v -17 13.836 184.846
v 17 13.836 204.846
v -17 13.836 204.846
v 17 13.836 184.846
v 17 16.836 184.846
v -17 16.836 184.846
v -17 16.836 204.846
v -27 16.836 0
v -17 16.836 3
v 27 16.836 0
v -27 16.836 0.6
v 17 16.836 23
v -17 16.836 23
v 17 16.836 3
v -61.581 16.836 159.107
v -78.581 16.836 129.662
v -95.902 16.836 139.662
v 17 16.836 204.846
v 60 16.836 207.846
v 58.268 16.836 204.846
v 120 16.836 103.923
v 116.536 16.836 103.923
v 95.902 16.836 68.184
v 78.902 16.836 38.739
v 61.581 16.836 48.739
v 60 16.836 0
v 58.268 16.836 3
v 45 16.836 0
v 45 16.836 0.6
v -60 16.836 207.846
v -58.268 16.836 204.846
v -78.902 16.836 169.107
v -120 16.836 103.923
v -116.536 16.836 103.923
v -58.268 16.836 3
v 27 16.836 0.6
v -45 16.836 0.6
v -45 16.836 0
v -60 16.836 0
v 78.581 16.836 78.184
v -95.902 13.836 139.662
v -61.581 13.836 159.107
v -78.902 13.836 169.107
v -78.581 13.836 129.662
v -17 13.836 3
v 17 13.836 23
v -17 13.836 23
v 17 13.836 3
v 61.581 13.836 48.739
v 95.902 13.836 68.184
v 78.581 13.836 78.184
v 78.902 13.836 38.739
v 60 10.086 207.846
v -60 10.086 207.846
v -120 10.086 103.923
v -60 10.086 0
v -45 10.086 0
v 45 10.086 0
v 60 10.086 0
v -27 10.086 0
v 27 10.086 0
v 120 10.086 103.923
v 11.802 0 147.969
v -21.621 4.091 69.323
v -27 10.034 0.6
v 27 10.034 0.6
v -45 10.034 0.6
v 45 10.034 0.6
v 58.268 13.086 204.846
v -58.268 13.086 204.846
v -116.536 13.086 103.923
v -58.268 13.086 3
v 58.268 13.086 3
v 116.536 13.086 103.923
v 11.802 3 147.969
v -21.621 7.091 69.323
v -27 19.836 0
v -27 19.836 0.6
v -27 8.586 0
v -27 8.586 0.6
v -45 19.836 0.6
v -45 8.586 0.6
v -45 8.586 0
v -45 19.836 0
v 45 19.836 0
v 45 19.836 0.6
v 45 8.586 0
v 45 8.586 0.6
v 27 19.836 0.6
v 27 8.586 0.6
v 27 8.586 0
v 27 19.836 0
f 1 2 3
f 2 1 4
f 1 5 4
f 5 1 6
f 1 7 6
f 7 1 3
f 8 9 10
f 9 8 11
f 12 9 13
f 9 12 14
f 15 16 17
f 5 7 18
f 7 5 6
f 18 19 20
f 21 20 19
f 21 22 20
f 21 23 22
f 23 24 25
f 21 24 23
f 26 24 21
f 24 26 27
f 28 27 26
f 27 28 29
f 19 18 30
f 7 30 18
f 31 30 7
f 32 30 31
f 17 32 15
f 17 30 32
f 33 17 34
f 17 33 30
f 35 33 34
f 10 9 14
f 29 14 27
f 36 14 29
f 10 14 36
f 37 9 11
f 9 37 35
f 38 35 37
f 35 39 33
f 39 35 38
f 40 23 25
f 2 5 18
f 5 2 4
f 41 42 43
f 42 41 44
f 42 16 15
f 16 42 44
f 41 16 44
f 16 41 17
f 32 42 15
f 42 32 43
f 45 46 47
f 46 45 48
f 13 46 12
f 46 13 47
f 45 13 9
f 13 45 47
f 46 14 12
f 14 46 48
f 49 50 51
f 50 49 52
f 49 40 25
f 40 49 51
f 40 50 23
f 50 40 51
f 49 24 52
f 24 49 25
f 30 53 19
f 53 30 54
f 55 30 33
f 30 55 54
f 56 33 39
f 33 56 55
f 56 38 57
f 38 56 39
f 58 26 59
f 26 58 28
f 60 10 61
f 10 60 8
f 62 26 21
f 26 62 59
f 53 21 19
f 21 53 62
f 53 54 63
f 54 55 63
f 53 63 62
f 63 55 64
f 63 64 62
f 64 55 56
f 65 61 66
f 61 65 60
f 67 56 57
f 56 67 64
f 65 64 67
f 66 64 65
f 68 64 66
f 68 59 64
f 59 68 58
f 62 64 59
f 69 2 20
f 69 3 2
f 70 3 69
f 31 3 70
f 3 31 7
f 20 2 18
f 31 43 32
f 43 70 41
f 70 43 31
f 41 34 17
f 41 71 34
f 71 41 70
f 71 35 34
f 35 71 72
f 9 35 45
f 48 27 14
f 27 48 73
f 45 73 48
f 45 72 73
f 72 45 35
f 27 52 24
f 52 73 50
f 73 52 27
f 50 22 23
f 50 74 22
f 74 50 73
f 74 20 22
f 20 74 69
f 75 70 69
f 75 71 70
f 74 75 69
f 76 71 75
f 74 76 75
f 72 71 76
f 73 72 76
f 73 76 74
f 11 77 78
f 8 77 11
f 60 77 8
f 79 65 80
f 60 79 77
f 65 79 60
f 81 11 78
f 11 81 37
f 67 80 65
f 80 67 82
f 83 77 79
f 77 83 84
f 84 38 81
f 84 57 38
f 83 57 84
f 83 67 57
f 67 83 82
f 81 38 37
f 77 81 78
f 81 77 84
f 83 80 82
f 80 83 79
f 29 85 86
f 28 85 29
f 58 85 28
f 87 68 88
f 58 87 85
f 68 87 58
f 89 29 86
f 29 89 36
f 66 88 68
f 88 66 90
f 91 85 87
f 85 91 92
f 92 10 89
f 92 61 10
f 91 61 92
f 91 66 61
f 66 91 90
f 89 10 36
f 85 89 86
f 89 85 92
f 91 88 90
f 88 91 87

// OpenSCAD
/*
    parametric_faceted_hex_wall_tile_mount_v26_multi_plate_vertical_joined.scad
    ----------------------------------------------------------------
    Regular asymmetric low-poly hex wall tile.

    v26 goals
    ---------
    1. Multi-object plate packing is the default design target.
    2. Preserve a TRUE regular hexagon -- no X/Y stretching.
    3. Default maximum corner-to-corner width = 240 mm / 9.449 in.
    4. Vertical export rests on a complete flat hex side, not a point.
    5. Open back remains fully open.
    6. Hidden mounting pads remain clipped below the visible face.
    7. One master thickness controls shell, perimeter, and pads.
    8. Integrated low-profile sacrificial stabilizer feet are enabled by default.
    9. Feet are intentionally shallow to improve multi-copy stability without
       consuming excessive plate depth.

    Recommended default
    -------------------
    face_size_reference      = "across_corners";
    face_size_units          = "mm";
    face_size                = 240.0;   // 9.449" maximum width

    tile_rotation_deg        = 15;

    export_orientation       = "vertical";
    vertical_edge_angle_deg  = 15;      // flat side on build plate

    master_thickness_mm      = 3.0;
    add_mount_pads           = true;
    add_mount_ribs           = false;

    // Multi-copy stability:
    add_vertical_breakaway_feet = true;
    vertical_foot_depth_mm       = 5.0;
    vertical_foot_height_mm      = 0.60;
    vertical_foot_neck_mm        = 0.80;

    Export
    ------
    F6 Render
    File -> Export -> Export as STL
*/


// =============================================================================
// CUSTOMIZER PARAMETERS
// =============================================================================


/* [Finished Face Size] */

// "bounding_square"
//     face_size is the maximum X and Y envelope.
//
// "flat_to_flat"
//     face_size is the traditional hex flat-to-flat dimension.
//
// "across_corners"
//     face_size is the regular-hex corner-to-corner dimension.
//
// v26 DEFAULT:
// across_corners = 240 mm so the vertically printed tile is about:
//     X = 240.0 mm
//     Z = 207.85 mm
// while resting on a complete flat edge.
face_size_reference = "across_corners"; // [bounding_square, flat_to_flat, across_corners]

// Units used by face_size.
face_size_units = "mm";                   // [mm, in]

// Default = 240 mm / 9.449 in maximum corner-to-corner width.
// This leaves useful X-axis margin on a 256 mm plate.
face_size = 240.0;

// Rotation of the finished hex within its face plane.
//
// IMPORTANT:
// 15 degrees gives a regular hex an equal X/Y bounding envelope.
// With bounding_square + 254 mm this produces approximately:
//     X = 254.0 mm
//     Y = 254.0 mm
tile_rotation_deg = 15;


/* [Export / Print Orientation] */

// "flat"     = conventional CAD orientation; decorative face points +Z.
// "vertical" = rotate final part onto an edge for vertical printing.
export_orientation = "vertical";          // [flat, vertical]

// Additional in-plane rotation used ONLY before standing the part vertically.
//
// IMPORTANT:
// The finished face uses tile_rotation_deg = 15 so its X/Y envelope is exactly
// square. A regular hex rests on a FLAT SIDE when its effective print-plane
// rotation is 30 degrees (modulo 60 degrees).
//
// Therefore the default vertical export adds another 15 degrees:
//
//     15 deg finished-face rotation
//   + 15 deg vertical export rotation
//   = 30 deg effective print rotation
//
// This puts a complete flat hex side on the build plate instead of a point.
// The transformed model is automatically translated so that side rests at Z=0.
// Rotate the finished 15-degree face orientation another 15 degrees before
// standing it up. 15 + 15 = 30 degrees, which places a complete hex side
// horizontally at the bottom rather than balancing the tile on a vertex.
vertical_edge_angle_deg = 15;

// Add small breakaway stabilizer feet after the model is stood vertically.
// Normally leave OFF and use a slicer brim if required.
add_vertical_breakaway_feet = true;

// Breakaway-foot dimensions.
vertical_foot_length_mm = 18.0;
vertical_foot_depth_mm = 5.0;
vertical_foot_height_mm = 0.60;
vertical_foot_neck_mm = 0.80;


/* [MASTER THICKNESS] */

// Main material thickness control.
master_thickness_mm = 3.0;

// Optional tuning multipliers.
front_shell_multiplier = 1.0;
perimeter_multiplier   = 1.0;
mount_pad_multiplier   = 1.0;


/* [Front Relief] */

// "proportional" scales relief with the true flat-to-flat dimension.
// "absolute" uses explicit millimeter values.
relief_height_mode = "proportional";      // [proportional, absolute]

relief_scale = 1.0;

// Relative relief proportions.
peak_height_ratio = 0.081;
ridge_to_peak_ratio = 0.757;
edge_to_peak_ratio = 0.097;

// Used only in absolute mode.
peak_height_mm   = 18.5;
ridge_height_mm = 14.0;
edge_height_mm  = 1.8;

// Minimum air gap between inner roof and mounting geometry.
edge_clearance_mm = 0.60;


/* [Facet Layout] */

peak_angle_deg = 45;
peak_radius_ratio = 0.38;

ridge_angle_deg = 208;
ridge_radius_ratio = 0.34;


/* [Wall Mounting] */

add_mount_pads = true;

// Width parallel to local hex edge.
mount_pad_width_mm = 34.0;

// Radial depth into the cavity.
mount_pad_depth_mm = 24.0;

// Structural overlap beneath the inner perimeter shell.
mount_pad_overlap_mm = 4.0;

// Pull mounting geometry inward from the visible outside perimeter.
 // Keep this smaller than the perimeter-wall thickness so the pad still
 // overlaps the wall by a positive amount.
// IMPORTANT:
 // Must be LESS than perimeter_wall_thickness_mm so the pads physically
 // overlap the perimeter wall and become one connected solid.
 mount_pad_edge_inset_mm = 1.0;

// Clearance below underside of visible face.
mount_face_clearance_mm = 0.75;

// Mount-pad directions in the tile's local coordinate system.
mount_pad_angles = [60, 120, 240, 300];


/* [Mount Reinforcement] */

add_mount_ribs = false;

mount_rib_width_mm  = 3.0;
mount_rib_height_mm = 5.0;
mount_rib_depth_mm  = 8.0;


/* [Optional Screw Holes] */

add_pad_screw_holes = false;

pad_screw_hole_diameter_mm = 4.5;



/* [Plate Packing Guidance] */

// These values do NOT duplicate objects inside the STL.
// They provide planning numbers in the OpenSCAD console for arranging
// multiple copies in the slicer.
//
// Typical X2D-style plate planning:
//   usable Y = 256 mm
//   keep a conservative front/rear margin
plate_depth_mm = 256.0;

plate_front_margin_mm = 8.0;
plate_rear_margin_mm  = 8.0;

// Recommended empty gap between adjacent standing tiles.
// Increase if using aggressive acceleration or if the printer has noticeable
// resonance/wobble on tall parts.
recommended_inter_tile_gap_mm = 8.0;

// Feet extend from Y=0 to vertical_foot_depth_mm.
// The actual tile relief occupies approximately peak_height in Y.
// Packing pitch uses whichever is deeper, plus the inter-tile gap.

/* [Advanced] */

polyhedron_convexity = 12;
screw_hole_fn = 40;

// Small numerical tolerance.
eps = 0.01;


// =============================================================================
// HELPERS
// =============================================================================

function polar(angle_deg, radius) =
    [
        radius * cos(angle_deg),
        radius * sin(angle_deg)
    ];

function hex_vertex_unrotated(i, radius) =
    [
        radius * cos(30 + i * 60),
        radius * sin(30 + i * 60)
    ];

function rotate2d(p, angle_deg) =
    [
        p[0] * cos(angle_deg) - p[1] * sin(angle_deg),
        p[0] * sin(angle_deg) + p[1] * cos(angle_deg)
    ];

function hex_vertex(i, radius) =
    rotate2d(
        hex_vertex_unrotated(i, radius),
        tile_rotation_deg
    );

// Half-width / half-height of a unit-circumradius rotated regular hex.
function unit_hex_half_x(rotation_deg) =
    max([
        for (i = [0 : 5])
            abs(
                cos(30 + i * 60 + rotation_deg)
            )
    ]);

function unit_hex_half_y(rotation_deg) =
    max([
        for (i = [0 : 5])
            abs(
                sin(30 + i * 60 + rotation_deg)
            )
    ]);

// Bounding box of a regular hex with circumradius r.
function hex_bbox_x(r, rotation_deg) =
    2 * r * unit_hex_half_x(rotation_deg);

function hex_bbox_y(r, rotation_deg) =
    2 * r * unit_hex_half_y(rotation_deg);


// =============================================================================
// DERIVED MATERIAL THICKNESSES
// =============================================================================

front_shell_thickness_mm =
    master_thickness_mm * front_shell_multiplier;

perimeter_wall_thickness_mm =
    master_thickness_mm * perimeter_multiplier;

mount_pad_thickness_mm =
    master_thickness_mm * mount_pad_multiplier;


// =============================================================================
// DERIVED FACE DIMENSIONS
// =============================================================================

_face_size_mm =
    face_size_units == "in"
        ? face_size * 25.4
        : face_size;

// If bounding_square is selected, choose the largest regular-hex radius that
// fits inside both the requested X and Y dimensions.
//
// At tile_rotation_deg = 15, unit X and Y extents are equal, so both dimensions
// become exactly face_size.
r_outer =
    face_size_reference == "flat_to_flat"
        ? (_face_size_mm / 2) / cos(30)
        : face_size_reference == "across_corners"
            ? _face_size_mm / 2
            : min(
                _face_size_mm / (2 * unit_hex_half_x(tile_rotation_deg)),
                _face_size_mm / (2 * unit_hex_half_y(tile_rotation_deg))
              );

tile_flat_to_flat =
    2 * r_outer * cos(30);

tile_across_corners =
    2 * r_outer;

finished_bbox_x =
    hex_bbox_x(r_outer, tile_rotation_deg);

finished_bbox_y =
    hex_bbox_y(r_outer, tile_rotation_deg);

outer_apothem =
    tile_flat_to_flat / 2;

inner_apothem =
    outer_apothem - perimeter_wall_thickness_mm;

r_inner =
    inner_apothem / cos(30);

inner_flat_length =
    2 * inner_apothem * tan(30);

hex_side_length =
    r_outer;


// =============================================================================
// DERIVED RELIEF HEIGHTS
// =============================================================================

_peak_unscaled =
    relief_height_mode == "proportional"
        ? tile_flat_to_flat * peak_height_ratio
        : peak_height_mm;

_ridge_unscaled =
    relief_height_mode == "proportional"
        ? _peak_unscaled * ridge_to_peak_ratio
        : ridge_height_mm;

_requested_edge_unscaled =
    relief_height_mode == "proportional"
        ? _peak_unscaled * edge_to_peak_ratio
        : edge_height_mm;

peak_height =
    _peak_unscaled * relief_scale;

ridge_height =
    _ridge_unscaled * relief_scale;

requested_edge_height =
    _requested_edge_unscaled * relief_scale;

// Enough vertical room for front shell + complete pad + clearance.
minimum_edge_height =
    front_shell_thickness_mm
    + mount_pad_thickness_mm
    + mount_face_clearance_mm;

edge_height =
    max(
        requested_edge_height,
        minimum_edge_height
    );


// =============================================================================
// DERIVED MOUNTING GEOMETRY
// =============================================================================

mount_pad_desired_outer_r =
    inner_apothem + mount_pad_overlap_mm;

mount_pad_inner_r =
    mount_pad_desired_outer_r - mount_pad_depth_mm;

mount_pad_center_r =
    mount_pad_desired_outer_r - mount_pad_depth_mm / 2;

mount_clip_apothem =
    outer_apothem - mount_pad_edge_inset_mm;

mount_clip_radius =
    mount_clip_apothem / cos(30);


// =============================================================================
// VERTICAL-EXPORT DERIVED VALUES
// =============================================================================
//
// The tile is first rotated around Z by vertical_edge_angle_deg, then stood up
// by +90 degrees around X.
//
// We calculate the local Y envelope AFTER that optional Z rotation so the
// final model can be translated to put its lowest point exactly on Z=0.

vertical_rotation_total_deg =
    vertical_edge_angle_deg;

vertical_half_y =
    max([
        for (i = [0 : 5])
            abs(
                r_outer
                * sin(
                    30
                    + i * 60
                    + tile_rotation_deg
                    + vertical_rotation_total_deg
                )
            )
    ]);

vertical_print_height =
    2 * vertical_half_y;

// After rotate([90,0,0]), original +Z becomes -Y.
// Translate by peak_height so all relief lies in positive Y.
vertical_print_depth =
    peak_height;

// Multi-copy packing envelope in Y.
//
// vertical_tile() occupies approximately peak_height of Y-depth.
// Breakaway feet occupy vertical_foot_depth_mm.
// Use the larger dimension as the per-part physical depth.
vertical_object_depth =
    add_vertical_breakaway_feet
        ? vertical_print_depth + 3.0
        : vertical_print_depth;

recommended_copy_pitch_y =
    vertical_object_depth + recommended_inter_tile_gap_mm;

usable_plate_depth =
    plate_depth_mm
    - plate_front_margin_mm
    - plate_rear_margin_mm;

estimated_copies_per_plate_depth =
    max(
        1,
        floor(
            (
                usable_plate_depth
                + recommended_inter_tile_gap_mm
            )
            / recommended_copy_pitch_y
        )
    );


// =============================================================================
// VALIDATION
// =============================================================================

assert(
    _face_size_mm > 0,
    "face_size must produce a positive dimension."
);

assert(
    master_thickness_mm > 0,
    "master_thickness_mm must be greater than zero."
);

assert(
    front_shell_multiplier > 0
    && perimeter_multiplier > 0
    && mount_pad_multiplier > 0,
    "All thickness multipliers must be greater than zero."
);

assert(
    front_shell_thickness_mm > 0,
    "front_shell_thickness_mm must be greater than zero."
);

assert(
    perimeter_wall_thickness_mm > 0,
    "perimeter_wall_thickness_mm must be greater than zero."
);

assert(
    perimeter_wall_thickness_mm < outer_apothem,
    "perimeter_wall_thickness_mm is too large for this tile."
);

assert(
    inner_apothem > 0,
    "The selected perimeter wall leaves no hollow interior."
);

assert(
    edge_height > front_shell_thickness_mm,
    "Internal error: edge_height must exceed front_shell_thickness_mm."
);

assert(
    ridge_height > edge_height,
    "ridge_height must remain greater than the effective edge height."
);

assert(
    peak_height > ridge_height,
    "peak_height must remain greater than ridge_height."
);

assert(
    peak_radius_ratio > 0 && peak_radius_ratio < 0.90,
    "peak_radius_ratio must be between 0 and 0.90."
);

assert(
    ridge_radius_ratio > 0 && ridge_radius_ratio < 0.90,
    "ridge_radius_ratio must be between 0 and 0.90."
);

assert(
    mount_pad_width_mm > 0,
    "mount_pad_width_mm must be greater than zero."
);

assert(
    mount_pad_depth_mm > 0,
    "mount_pad_depth_mm must be greater than zero."
);

assert(
    mount_pad_thickness_mm > 0,
    "mount_pad_thickness_mm must be greater than zero."
);

assert(
    mount_pad_overlap_mm >= 0,
    "mount_pad_overlap_mm cannot be negative."
);

assert(
    mount_pad_edge_inset_mm >= 0,
    "mount_pad_edge_inset_mm cannot be negative."
);

assert(
    mount_pad_edge_inset_mm < perimeter_wall_thickness_mm,
    "mount_pad_edge_inset_mm must be smaller than perimeter_wall_thickness_mm so mounting pads overlap and join the perimeter wall."
);

assert(
    mount_face_clearance_mm >= 0,
    "mount_face_clearance_mm cannot be negative."
);

assert(
    mount_clip_apothem > 0,
    "mount_pad_edge_inset_mm is too large."
);

assert(
    mount_pad_inner_r > 0,
    "mount_pad_depth_mm is too large and reaches/passes the tile center."
);

assert(
    !add_pad_screw_holes
    || pad_screw_hole_diameter_mm < mount_pad_width_mm * 0.75,
    "pad_screw_hole_diameter_mm is too large for the mounting pad."
);

assert(
    !add_mount_ribs
    || mount_rib_height_mm > 0,
    "mount_rib_height_mm must be greater than zero."
);

assert(
    !add_vertical_breakaway_feet
    || export_orientation == "vertical",
    "Vertical breakaway feet require export_orientation = \"vertical\"."
);

assert(
    plate_depth_mm > 0,
    "plate_depth_mm must be greater than zero."
);

assert(
    plate_front_margin_mm >= 0
    && plate_rear_margin_mm >= 0,
    "Plate margins cannot be negative."
);

assert(
    recommended_inter_tile_gap_mm >= 0,
    "recommended_inter_tile_gap_mm cannot be negative."
);

assert(
    usable_plate_depth > 0,
    "Plate margins leave no usable plate depth."
);


// =============================================================================
// DIAGNOSTIC OUTPUT
// =============================================================================

echo("====================================================");
echo("FACETED HEX WALL TILE v26 - MULTI-PLATE / JOINED GEOMETRY");
echo("====================================================");

echo(str("face size reference      : ", face_size_reference));
echo(str("requested face size      : ", _face_size_mm, " mm"));
echo(str("tile rotation            : ", tile_rotation_deg, " deg"));

echo(str("finished bbox X          : ", finished_bbox_x, " mm"));
echo(str("finished bbox Y          : ", finished_bbox_y, " mm"));
echo(str("finished bbox X inches   : ", finished_bbox_x / 25.4, " in"));
echo(str("finished bbox Y inches   : ", finished_bbox_y / 25.4, " in"));

echo(str("flat-to-flat             : ", tile_flat_to_flat, " mm"));
echo(str("across-corners           : ", tile_across_corners, " mm"));
echo(str("hex side length          : ", hex_side_length, " mm"));

echo(str("MASTER thickness         : ", master_thickness_mm, " mm"));
echo(str("actual front shell       : ", front_shell_thickness_mm, " mm"));
echo(str("actual perimeter wall    : ", perimeter_wall_thickness_mm, " mm"));
echo(str("actual mount pad         : ", mount_pad_thickness_mm, " mm"));

echo(str("requested edge height    : ", requested_edge_height, " mm"));
echo(str("minimum edge height      : ", minimum_edge_height, " mm"));
echo(str("EFFECTIVE edge height    : ", edge_height, " mm"));

echo(str("ridge height             : ", ridge_height, " mm"));
echo(str("peak height              : ", peak_height, " mm"));
echo(str("peak height inches       : ", peak_height / 25.4, " in"));

echo(str("mount pad width          : ", mount_pad_width_mm, " mm"));
echo(str("mount pad depth          : ", mount_pad_depth_mm, " mm"));
echo(str("mount pad thickness      : ", mount_pad_thickness_mm, " mm"));
echo(str("mount pad overlap        : ", mount_pad_overlap_mm, " mm"));
echo(str("mount edge inset         : ", mount_pad_edge_inset_mm, " mm"));
echo(str("mount/face clearance     : ", mount_face_clearance_mm, " mm"));

echo(str("export orientation       : ", export_orientation));
echo(str("vertical extra rotation  : ", vertical_edge_angle_deg, " deg"));
echo(str("effective print rotation : ",
         tile_rotation_deg + vertical_edge_angle_deg, " deg"));

if (export_orientation == "vertical"
    && abs(
        ((tile_rotation_deg + vertical_edge_angle_deg) % 60) - 30
    ) < 0.001)
    echo("build-plate contact      : FLAT HEX SIDE");
else if (export_orientation == "vertical")
    echo("build-plate contact      : WARNING - NOT EXACTLY FLAT-SIDE DOWN");

if (export_orientation == "vertical") {
    echo(str("vertical print height    : ", vertical_print_height, " mm"));
    echo(str("vertical relief depth    : ", vertical_print_depth, " mm"));
    echo(str("vertical object depth    : ", vertical_object_depth, " mm"));
    echo(str("recommended Y gap        : ", recommended_inter_tile_gap_mm, " mm"));
    echo(str("recommended Y pitch      : ", recommended_copy_pitch_y, " mm"));
    echo(str("usable plate Y depth     : ", usable_plate_depth, " mm"));
    echo(str("estimated copies in Y    : ", estimated_copies_per_plate_depth));
}

if (edge_height > requested_edge_height)
    echo(
        str(
            "AUTO EDGE FIX ACTIVE: edge raised from ",
            requested_edge_height,
            " mm to ",
            edge_height,
            " mm."
        )
    );

echo("====================================================");


// =============================================================================
// FRONT RELIEF CONTROL POINTS
// =============================================================================

P_xy =
    polar(
        peak_angle_deg + tile_rotation_deg,
        r_outer * peak_radius_ratio
    );

Q_xy =
    polar(
        ridge_angle_deg + tile_rotation_deg,
        r_outer * ridge_radius_ratio
    );


// =============================================================================
// SHELL VERTICES
// =============================================================================

points =
    concat(

        // 0..5 : outer rear perimeter
        [
            for (i = [0 : 5])
                let(p = hex_vertex(i, r_outer))
                [p[0], p[1], 0]
        ],

        // 6..11 : outer front perimeter
        [
            for (i = [0 : 5])
                let(p = hex_vertex(i, r_outer))
                [p[0], p[1], edge_height]
        ],

        // 12..13 : outer peak / ridge
        [
            [P_xy[0], P_xy[1], peak_height],
            [Q_xy[0], Q_xy[1], ridge_height]
        ],

        // 14..19 : inner rear perimeter
        [
            for (i = [0 : 5])
                let(p = hex_vertex(i, r_inner))
                [p[0], p[1], 0]
        ],

        // 20..25 : inner front perimeter
        [
            for (i = [0 : 5])
                let(p = hex_vertex(i, r_inner))
                [p[0], p[1], edge_height - front_shell_thickness_mm]
        ],

        // 26..27 : inner peak / ridge
        [
            [
                P_xy[0],
                P_xy[1],
                peak_height - front_shell_thickness_mm
            ],
            [
                Q_xy[0],
                Q_xy[1],
                ridge_height - front_shell_thickness_mm
            ]
        ]
    );


// =============================================================================
// SHELL FACES
// =============================================================================

outer_roof_faces = [
    [6, 7, 12],
    [7, 8, 12],
    [6, 12, 11],

    [8, 13, 12],
    [11, 12, 13],

    [8, 9, 13],
    [9, 10, 13],
    [10, 11, 13]
];

inner_roof_faces = [
    [26, 21, 20],
    [26, 22, 21],
    [25, 26, 20],

    [26, 27, 22],
    [27, 26, 25],

    [27, 23, 22],
    [27, 24, 23],
    [27, 25, 24]
];

faces =
    concat(

        // Outer vertical perimeter
        [
            for (i = [0 : 5])
                [
                    i,
                    (i + 1) % 6,
                    6 + (i + 1) % 6,
                    6 + i
                ]
        ],

        outer_roof_faces,

        // Inner vertical perimeter
        [
            for (i = [0 : 5])
                [
                    14 + i,
                    20 + i,
                    20 + (i + 1) % 6,
                    14 + (i + 1) % 6
                ]
        ],

        inner_roof_faces,

        // Narrow rear perimeter ring only.
        // Center remains fully open.
        [
            for (i = [0 : 5])
                [
                    i,
                    14 + i,
                    14 + (i + 1) % 6,
                    (i + 1) % 6
                ]
        ]
    );


// =============================================================================
// TILE SHELL
// =============================================================================

module tile_shell() {
    polyhedron(
        points = points,
        faces = faces,
        convexity = polyhedron_convexity
    );
}


// =============================================================================
// SAFE MOUNTING VOLUME BELOW FRONT FACE
// =============================================================================

safe_edge_z =
    max(
        eps,
        edge_height
        - front_shell_thickness_mm
        - mount_face_clearance_mm
    );

safe_peak_z =
    max(
        eps,
        peak_height
        - front_shell_thickness_mm
        - mount_face_clearance_mm
    );

safe_ridge_z =
    max(
        eps,
        ridge_height
        - front_shell_thickness_mm
        - mount_face_clearance_mm
    );

safe_mount_points =
    concat(

        // 0..5 : rear outer perimeter
        [
            for (i = [0 : 5])
                let(p = hex_vertex(i, r_outer))
                [p[0], p[1], 0]
        ],

        // 6..11 : safe ceiling at outer perimeter
        [
            for (i = [0 : 5])
                let(p = hex_vertex(i, r_outer))
                [p[0], p[1], safe_edge_z]
        ],

        // 12..13 : safe ceiling under peak/ridge
        [
            [P_xy[0], P_xy[1], safe_peak_z],
            [Q_xy[0], Q_xy[1], safe_ridge_z]
        ]
    );

safe_mount_ceiling_faces = [
    [6, 7, 12],
    [7, 8, 12],
    [6, 12, 11],
    [8, 13, 12],
    [11, 12, 13],
    [8, 9, 13],
    [9, 10, 13],
    [10, 11, 13]
];

safe_mount_faces =
    concat(

        // Outer side walls.
        [
            for (i = [0 : 5])
                [
                    i,
                    (i + 1) % 6,
                    6 + (i + 1) % 6,
                    6 + i
                ]
        ],

        // Sloped safe ceiling.
        safe_mount_ceiling_faces,

        // Rear floor used only to close clipping volume.
        [[5, 4, 3, 2, 1, 0]]
    );

module safe_mount_volume() {
    polyhedron(
        points = safe_mount_points,
        faces = safe_mount_faces,
        convexity = polyhedron_convexity
    );
}


// =============================================================================
// HEX FOOTPRINT FOR MOUNT CLIPPING
// =============================================================================

module mount_clip_volume(height_mm) {
    linear_extrude(height = height_mm)
        polygon(
            points = [
                for (i = [0 : 5])
                    hex_vertex(i, mount_clip_radius)
            ]
        );
}


// =============================================================================
// RAW MOUNT PAD
// =============================================================================
//
// Mount-pad angles are local tile angles. tile_rotation_deg is applied so the
// pads remain attached to the same visual positions when the face rotates.

module raw_mount_pad(angle_deg) {
    rotate([0, 0, angle_deg + tile_rotation_deg])
        translate(
            [
                mount_pad_inner_r,
                -mount_pad_width_mm / 2,
                0
            ]
        )
            cube(
                [
                    mount_pad_depth_mm,
                    mount_pad_width_mm,
                    mount_pad_thickness_mm
                ]
            );
}


// =============================================================================
// CLIPPED MOUNT PAD
// =============================================================================

module mount_pad(angle_deg) {
    intersection() {

        raw_mount_pad(angle_deg);

        // Keep pad inside inset hex footprint.
        mount_clip_volume(
            mount_pad_thickness_mm + eps
        );

        // Hard stop below underside of front shell.
        safe_mount_volume();
    }
}


// =============================================================================
// OPTIONAL REINFORCING RIBS
// =============================================================================

module raw_mount_ribs(angle_deg) {

    rib_center_r =
        mount_pad_desired_outer_r
        - mount_rib_depth_mm / 2;

    rib_side_offset =
        max(
            0,
            mount_pad_width_mm / 2
            - mount_rib_width_mm
            - 2
        );

    rotate([0, 0, angle_deg + tile_rotation_deg]) {

        for (side = [-1, 1]) {

            translate(
                [
                    rib_center_r - mount_rib_depth_mm / 2,
                    side * rib_side_offset - mount_rib_width_mm / 2,
                    mount_pad_thickness_mm
                ]
            )

            rotate([90, 0, 90])

            linear_extrude(height = mount_rib_depth_mm)

            polygon(
                points = [
                    [0, 0],
                    [mount_rib_width_mm, 0],
                    [mount_rib_width_mm, mount_rib_height_mm],
                    [0, 0]
                ]
            );
        }
    }
}

module mount_ribs(angle_deg) {
    intersection() {

        raw_mount_ribs(angle_deg);

        mount_clip_volume(
            mount_pad_thickness_mm
            + mount_rib_height_mm
            + 0.1
        );

        safe_mount_volume();
    }
}


// =============================================================================
// OPTIONAL SCREW HOLE
// =============================================================================

module pad_screw_hole(angle_deg) {

    rotate([0, 0, angle_deg + tile_rotation_deg])

        translate(
            [
                mount_pad_center_r,
                0,
                -1
            ]
        )

            cylinder(
                d = pad_screw_hole_diameter_mm,
                h =
                    mount_pad_thickness_mm
                    + mount_rib_height_mm
                    + 2,
                $fn = screw_hole_fn
            );
}


// =============================================================================
// COMPLETE FINISHED TILE
// =============================================================================

module finished_tile() {

    difference() {

        union() {

            tile_shell();

            if (add_mount_pads) {

                for (a = mount_pad_angles) {

                    mount_pad(a);

                    if (add_mount_ribs)
                        mount_ribs(a);
                }
            }
        }

        if (
            add_mount_pads
            && add_pad_screw_holes
        ) {

            for (a = mount_pad_angles)
                pad_screw_hole(a);
        }
    }
}


// =============================================================================
// VERTICAL-PRINT TRANSFORM
// =============================================================================
//
// Transform order in OpenSCAD is inside-out:
//
// 1. finished_tile()
// 2. optional extra Z rotation for selecting another edge
// 3. rotate +90 degrees around X so the face stands vertically
// 4. translate so:
//      - relief depth occupies positive Y
//      - lowest tile point is exactly at Z=0

module vertical_tile() {

    translate(
        [
            0,
            peak_height,
            vertical_half_y
        ]
    )

    rotate([90, 0, 0])

    rotate([0, 0, vertical_edge_angle_deg])

        finished_tile();
}


// =============================================================================
// OPTIONAL BREAKAWAY VERTICAL FEET
// =============================================================================
//
// These are intentionally simple sacrificial tabs.
// They are added only in vertical export mode.
// Leave OFF unless a brim alone is not sufficient.

module vertical_breakaway_feet() {

    /*
        CONNECTED stabilizer feet.

        For flat-side-down vertical export, the bottom perimeter wall occupies
        approximately:

            Y = peak_height - edge_height  ...  peak_height

        and the bottom flat side spans roughly one hex-side length in X.

        The v25 feet were placed near Y=0 and too far outward in X, so they
        could become disconnected solids. v26 deliberately overlaps the
        actual bottom perimeter wall in both X and Y.

        The tabs extend only a few millimeters beyond the rear face, keeping
        Y-depth compact for multi-copy plate packing.
    */

    foot_center_x =
        hex_side_length * 0.30;

    // Safely inside the actual bottom flat-edge span.
    foot_length_x =
        min(
            vertical_foot_length_mm,
            hex_side_length * 0.25
        );

    // Bottom perimeter wall depth after the vertical transform.
    bottom_wall_y_min =
        peak_height - edge_height;

    bottom_wall_y_max =
        peak_height;

    // Extend a little toward the decorative face and a little behind the tile.
    foot_y_min =
        max(
            0,
            bottom_wall_y_min - 1.5
        );

    foot_y_max =
        bottom_wall_y_max + 3.0;

    attached_foot_depth =
        foot_y_max - foot_y_min;

    for (x = [-foot_center_x, foot_center_x]) {

        // Main shallow sacrificial pad.
        //
        // It overlaps the lower perimeter wall in volume, so CGAL produces
        // one connected body instead of merely touching at a plane.
        translate(
            [
                x - foot_length_x / 2,
                foot_y_min,
                0
            ]
        )
            cube(
                [
                    foot_length_x,
                    attached_foot_depth,
                    vertical_foot_height_mm
                ]
            );

        // Small reinforcing neck rising into the bottom perimeter wall.
        translate(
            [
                x - vertical_foot_neck_mm / 2,
                bottom_wall_y_min,
                0
            ]
        )
            cube(
                [
                    vertical_foot_neck_mm,
                    edge_height,
                    min(3.0, perimeter_wall_thickness_mm)
                ]
            );
    }
}


// =============================================================================
// OUTPUT
// =============================================================================
//
// Default v26 exported STL target:
//   X ~ 240.00 mm  / 9.449 in
//   Y ~ relief depth (~17-19 mm depending on relief settings)
//   Z ~ 207.85 mm  / 8.183 in
//
// Multiple copies should be duplicated and arrayed along Y in the slicer.

module output_model() {

    if (export_orientation == "vertical") {

        union() {

            vertical_tile();

            if (add_vertical_breakaway_feet)
                vertical_breakaway_feet();
        }

    } else {

        finished_tile();
    }
}

output_model();
